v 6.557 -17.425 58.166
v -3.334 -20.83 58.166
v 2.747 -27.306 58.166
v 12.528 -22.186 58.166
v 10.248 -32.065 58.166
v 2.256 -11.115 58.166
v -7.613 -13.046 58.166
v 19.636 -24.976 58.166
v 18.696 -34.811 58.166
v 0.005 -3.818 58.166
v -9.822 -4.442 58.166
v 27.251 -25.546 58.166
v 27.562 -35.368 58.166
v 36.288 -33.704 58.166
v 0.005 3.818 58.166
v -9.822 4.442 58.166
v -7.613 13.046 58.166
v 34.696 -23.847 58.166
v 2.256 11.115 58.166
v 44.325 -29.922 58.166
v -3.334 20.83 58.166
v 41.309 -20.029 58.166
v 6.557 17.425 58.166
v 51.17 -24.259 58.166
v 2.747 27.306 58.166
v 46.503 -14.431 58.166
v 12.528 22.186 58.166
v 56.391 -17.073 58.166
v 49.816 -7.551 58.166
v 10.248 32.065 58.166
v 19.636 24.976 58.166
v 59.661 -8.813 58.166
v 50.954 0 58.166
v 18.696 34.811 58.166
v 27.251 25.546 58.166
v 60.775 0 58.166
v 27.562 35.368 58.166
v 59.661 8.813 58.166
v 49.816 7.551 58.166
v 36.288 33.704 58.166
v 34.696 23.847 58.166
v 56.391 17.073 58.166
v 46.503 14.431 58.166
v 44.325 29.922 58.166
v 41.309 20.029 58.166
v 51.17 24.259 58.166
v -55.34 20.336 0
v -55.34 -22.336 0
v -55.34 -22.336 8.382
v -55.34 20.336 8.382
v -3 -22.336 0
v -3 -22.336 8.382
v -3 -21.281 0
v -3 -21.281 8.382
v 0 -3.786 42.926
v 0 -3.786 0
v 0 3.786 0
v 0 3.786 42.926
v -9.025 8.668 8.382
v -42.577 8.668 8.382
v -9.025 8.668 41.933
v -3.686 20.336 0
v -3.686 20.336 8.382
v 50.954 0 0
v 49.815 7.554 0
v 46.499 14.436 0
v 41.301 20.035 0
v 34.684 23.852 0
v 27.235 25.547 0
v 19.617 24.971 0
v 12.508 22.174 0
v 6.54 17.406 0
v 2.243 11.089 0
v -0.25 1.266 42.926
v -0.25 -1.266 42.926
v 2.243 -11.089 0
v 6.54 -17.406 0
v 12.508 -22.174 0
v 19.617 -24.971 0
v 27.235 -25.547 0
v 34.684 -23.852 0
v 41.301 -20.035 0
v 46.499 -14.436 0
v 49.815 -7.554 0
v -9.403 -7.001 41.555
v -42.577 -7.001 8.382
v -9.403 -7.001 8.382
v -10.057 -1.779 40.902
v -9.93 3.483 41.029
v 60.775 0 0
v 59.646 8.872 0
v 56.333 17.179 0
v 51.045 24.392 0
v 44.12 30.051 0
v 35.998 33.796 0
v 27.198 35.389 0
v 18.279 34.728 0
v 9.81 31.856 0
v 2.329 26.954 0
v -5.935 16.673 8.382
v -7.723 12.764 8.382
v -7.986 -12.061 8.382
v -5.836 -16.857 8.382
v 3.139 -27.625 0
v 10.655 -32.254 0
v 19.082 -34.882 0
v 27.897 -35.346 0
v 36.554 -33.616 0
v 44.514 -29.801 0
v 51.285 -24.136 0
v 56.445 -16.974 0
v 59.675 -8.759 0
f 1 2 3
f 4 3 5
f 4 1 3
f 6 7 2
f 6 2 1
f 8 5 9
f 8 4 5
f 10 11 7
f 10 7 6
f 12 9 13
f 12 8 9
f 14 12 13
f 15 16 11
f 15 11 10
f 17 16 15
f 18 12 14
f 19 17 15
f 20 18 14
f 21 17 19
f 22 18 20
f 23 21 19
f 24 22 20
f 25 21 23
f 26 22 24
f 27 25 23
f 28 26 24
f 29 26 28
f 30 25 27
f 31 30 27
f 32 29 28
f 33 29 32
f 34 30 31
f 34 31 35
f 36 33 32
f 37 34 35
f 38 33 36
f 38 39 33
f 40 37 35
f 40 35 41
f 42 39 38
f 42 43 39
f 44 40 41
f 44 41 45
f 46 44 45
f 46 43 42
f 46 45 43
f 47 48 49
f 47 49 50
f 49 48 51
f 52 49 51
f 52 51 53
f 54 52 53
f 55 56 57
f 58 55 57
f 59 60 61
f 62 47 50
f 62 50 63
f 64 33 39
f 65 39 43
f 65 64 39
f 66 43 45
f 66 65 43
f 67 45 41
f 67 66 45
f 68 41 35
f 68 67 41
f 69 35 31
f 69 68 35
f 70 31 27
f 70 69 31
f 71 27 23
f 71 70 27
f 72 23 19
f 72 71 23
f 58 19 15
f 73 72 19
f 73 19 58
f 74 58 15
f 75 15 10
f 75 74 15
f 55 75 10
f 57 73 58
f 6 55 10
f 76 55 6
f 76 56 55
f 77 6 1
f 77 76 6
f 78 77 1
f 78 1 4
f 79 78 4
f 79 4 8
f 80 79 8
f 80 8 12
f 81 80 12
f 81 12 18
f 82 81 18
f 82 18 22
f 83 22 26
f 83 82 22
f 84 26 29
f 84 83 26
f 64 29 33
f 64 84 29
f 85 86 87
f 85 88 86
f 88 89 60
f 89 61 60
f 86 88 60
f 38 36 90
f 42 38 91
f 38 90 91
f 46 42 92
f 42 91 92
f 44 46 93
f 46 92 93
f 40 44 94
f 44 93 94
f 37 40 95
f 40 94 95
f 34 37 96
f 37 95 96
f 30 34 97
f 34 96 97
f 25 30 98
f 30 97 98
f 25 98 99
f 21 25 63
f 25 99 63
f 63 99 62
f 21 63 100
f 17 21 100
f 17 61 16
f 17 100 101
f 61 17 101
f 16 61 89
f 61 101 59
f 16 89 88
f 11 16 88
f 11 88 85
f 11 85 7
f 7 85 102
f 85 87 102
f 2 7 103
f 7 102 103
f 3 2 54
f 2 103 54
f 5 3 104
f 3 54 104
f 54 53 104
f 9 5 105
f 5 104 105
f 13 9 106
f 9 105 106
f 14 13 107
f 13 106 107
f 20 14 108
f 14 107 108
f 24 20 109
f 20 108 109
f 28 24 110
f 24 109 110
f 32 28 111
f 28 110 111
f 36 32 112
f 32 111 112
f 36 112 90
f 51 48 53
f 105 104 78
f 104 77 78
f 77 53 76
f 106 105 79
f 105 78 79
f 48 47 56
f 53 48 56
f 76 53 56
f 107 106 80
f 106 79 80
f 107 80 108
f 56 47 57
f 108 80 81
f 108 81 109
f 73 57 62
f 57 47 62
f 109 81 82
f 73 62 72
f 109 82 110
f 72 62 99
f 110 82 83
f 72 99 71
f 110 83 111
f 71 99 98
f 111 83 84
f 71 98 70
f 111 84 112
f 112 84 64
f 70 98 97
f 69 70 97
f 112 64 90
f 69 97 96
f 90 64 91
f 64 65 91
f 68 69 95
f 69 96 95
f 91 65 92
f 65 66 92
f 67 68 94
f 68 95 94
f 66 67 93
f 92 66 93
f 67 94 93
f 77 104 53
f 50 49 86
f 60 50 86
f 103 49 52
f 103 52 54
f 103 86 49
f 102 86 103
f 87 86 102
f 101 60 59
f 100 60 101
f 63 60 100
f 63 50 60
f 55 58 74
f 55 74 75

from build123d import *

# Parameters (mm, degrees)
F0_W        = 52.3398779333
F0_H        = 42.6720008254
F1_DEPTH    = 8.382
F2_R        = 35.438248993
F3_DEPTH    = 58.166
F4_R        = 25.617866598
F5_DEPTH    = 76.454
F6_W        = 48.6727505922
F6_H        = 15.6686254777
F7_DEPTH    = 42.926
F8_T4_DEPTH = 224.6950187396
F8_S5_R     = 35.438248993
F8_T6_DEPTH = 117


# Not quite as in the source:
# - a fillet or chamfer that OpenCascade refuses, or shapes differently, is made with other operations: its cross-section is extruded or revolved along the edge and cut away or added


with BuildPart() as f1:
    # F0 (on Top) → F1 (new body)
    with BuildSketch(Plane.XY):
        with Locations((-29.17031385, -1.0001249611)):
            Rectangle(F0_W, F0_H)
    extrude(amount=F1_DEPTH)

    # F2 (on Top) → F3 (join)
    with BuildSketch(Plane.XY):
        with Locations((25.3365002573, 0)):
            Circle(F2_R)
    extrude(amount=F3_DEPTH)

    # F4 (on Top) → F5 (cut)
    with BuildSketch(Plane.XY):
        with Locations((25.3365002573, 0)):
            Circle(F4_R)
    extrude(amount=F5_DEPTH, mode=Mode.SUBTRACT)

    # F6 (on Top) → F7 (join)
    with BuildSketch(Plane.XY):
        with Locations((-24.3363752961, 0.8334375452)):
            Rectangle(F6_W, F6_H)
    extrude(amount=F7_DEPTH)

    # F8: chamfer of 40.64 on 1 edges, made by hand


with BuildPart() as f8_tool2:
    # F8_s3 → F8_t4 (new body)
    with BuildSketch(Plane.XZ.offset(-113.180946915)):
        Polygon((-8.0327505922, 42.926), (-48.6727505922, 2.286), (-48.6727505922, 42.926), align=None)
    extrude(amount=F8_T4_DEPTH)

    # F8_s5 → F8_t6 (cut, symmetric)
    with BuildSketch(Plane.XY.offset(22.6)):
        with Locations((25.3365002573, 0)):
            Circle(F8_S5_R)
    extrude(amount=F8_T6_DEPTH, both=True, mode=Mode.SUBTRACT)

    split(bisect_by=Plane.XY.offset(8.382), keep=Keep.TOP)


with BuildPart() as f1_1:
    add(f1.part)

    # F8_t1: cut F8_tool2
    add(f8_tool2.part, mode=Mode.SUBTRACT)


solid = f1_1.part
